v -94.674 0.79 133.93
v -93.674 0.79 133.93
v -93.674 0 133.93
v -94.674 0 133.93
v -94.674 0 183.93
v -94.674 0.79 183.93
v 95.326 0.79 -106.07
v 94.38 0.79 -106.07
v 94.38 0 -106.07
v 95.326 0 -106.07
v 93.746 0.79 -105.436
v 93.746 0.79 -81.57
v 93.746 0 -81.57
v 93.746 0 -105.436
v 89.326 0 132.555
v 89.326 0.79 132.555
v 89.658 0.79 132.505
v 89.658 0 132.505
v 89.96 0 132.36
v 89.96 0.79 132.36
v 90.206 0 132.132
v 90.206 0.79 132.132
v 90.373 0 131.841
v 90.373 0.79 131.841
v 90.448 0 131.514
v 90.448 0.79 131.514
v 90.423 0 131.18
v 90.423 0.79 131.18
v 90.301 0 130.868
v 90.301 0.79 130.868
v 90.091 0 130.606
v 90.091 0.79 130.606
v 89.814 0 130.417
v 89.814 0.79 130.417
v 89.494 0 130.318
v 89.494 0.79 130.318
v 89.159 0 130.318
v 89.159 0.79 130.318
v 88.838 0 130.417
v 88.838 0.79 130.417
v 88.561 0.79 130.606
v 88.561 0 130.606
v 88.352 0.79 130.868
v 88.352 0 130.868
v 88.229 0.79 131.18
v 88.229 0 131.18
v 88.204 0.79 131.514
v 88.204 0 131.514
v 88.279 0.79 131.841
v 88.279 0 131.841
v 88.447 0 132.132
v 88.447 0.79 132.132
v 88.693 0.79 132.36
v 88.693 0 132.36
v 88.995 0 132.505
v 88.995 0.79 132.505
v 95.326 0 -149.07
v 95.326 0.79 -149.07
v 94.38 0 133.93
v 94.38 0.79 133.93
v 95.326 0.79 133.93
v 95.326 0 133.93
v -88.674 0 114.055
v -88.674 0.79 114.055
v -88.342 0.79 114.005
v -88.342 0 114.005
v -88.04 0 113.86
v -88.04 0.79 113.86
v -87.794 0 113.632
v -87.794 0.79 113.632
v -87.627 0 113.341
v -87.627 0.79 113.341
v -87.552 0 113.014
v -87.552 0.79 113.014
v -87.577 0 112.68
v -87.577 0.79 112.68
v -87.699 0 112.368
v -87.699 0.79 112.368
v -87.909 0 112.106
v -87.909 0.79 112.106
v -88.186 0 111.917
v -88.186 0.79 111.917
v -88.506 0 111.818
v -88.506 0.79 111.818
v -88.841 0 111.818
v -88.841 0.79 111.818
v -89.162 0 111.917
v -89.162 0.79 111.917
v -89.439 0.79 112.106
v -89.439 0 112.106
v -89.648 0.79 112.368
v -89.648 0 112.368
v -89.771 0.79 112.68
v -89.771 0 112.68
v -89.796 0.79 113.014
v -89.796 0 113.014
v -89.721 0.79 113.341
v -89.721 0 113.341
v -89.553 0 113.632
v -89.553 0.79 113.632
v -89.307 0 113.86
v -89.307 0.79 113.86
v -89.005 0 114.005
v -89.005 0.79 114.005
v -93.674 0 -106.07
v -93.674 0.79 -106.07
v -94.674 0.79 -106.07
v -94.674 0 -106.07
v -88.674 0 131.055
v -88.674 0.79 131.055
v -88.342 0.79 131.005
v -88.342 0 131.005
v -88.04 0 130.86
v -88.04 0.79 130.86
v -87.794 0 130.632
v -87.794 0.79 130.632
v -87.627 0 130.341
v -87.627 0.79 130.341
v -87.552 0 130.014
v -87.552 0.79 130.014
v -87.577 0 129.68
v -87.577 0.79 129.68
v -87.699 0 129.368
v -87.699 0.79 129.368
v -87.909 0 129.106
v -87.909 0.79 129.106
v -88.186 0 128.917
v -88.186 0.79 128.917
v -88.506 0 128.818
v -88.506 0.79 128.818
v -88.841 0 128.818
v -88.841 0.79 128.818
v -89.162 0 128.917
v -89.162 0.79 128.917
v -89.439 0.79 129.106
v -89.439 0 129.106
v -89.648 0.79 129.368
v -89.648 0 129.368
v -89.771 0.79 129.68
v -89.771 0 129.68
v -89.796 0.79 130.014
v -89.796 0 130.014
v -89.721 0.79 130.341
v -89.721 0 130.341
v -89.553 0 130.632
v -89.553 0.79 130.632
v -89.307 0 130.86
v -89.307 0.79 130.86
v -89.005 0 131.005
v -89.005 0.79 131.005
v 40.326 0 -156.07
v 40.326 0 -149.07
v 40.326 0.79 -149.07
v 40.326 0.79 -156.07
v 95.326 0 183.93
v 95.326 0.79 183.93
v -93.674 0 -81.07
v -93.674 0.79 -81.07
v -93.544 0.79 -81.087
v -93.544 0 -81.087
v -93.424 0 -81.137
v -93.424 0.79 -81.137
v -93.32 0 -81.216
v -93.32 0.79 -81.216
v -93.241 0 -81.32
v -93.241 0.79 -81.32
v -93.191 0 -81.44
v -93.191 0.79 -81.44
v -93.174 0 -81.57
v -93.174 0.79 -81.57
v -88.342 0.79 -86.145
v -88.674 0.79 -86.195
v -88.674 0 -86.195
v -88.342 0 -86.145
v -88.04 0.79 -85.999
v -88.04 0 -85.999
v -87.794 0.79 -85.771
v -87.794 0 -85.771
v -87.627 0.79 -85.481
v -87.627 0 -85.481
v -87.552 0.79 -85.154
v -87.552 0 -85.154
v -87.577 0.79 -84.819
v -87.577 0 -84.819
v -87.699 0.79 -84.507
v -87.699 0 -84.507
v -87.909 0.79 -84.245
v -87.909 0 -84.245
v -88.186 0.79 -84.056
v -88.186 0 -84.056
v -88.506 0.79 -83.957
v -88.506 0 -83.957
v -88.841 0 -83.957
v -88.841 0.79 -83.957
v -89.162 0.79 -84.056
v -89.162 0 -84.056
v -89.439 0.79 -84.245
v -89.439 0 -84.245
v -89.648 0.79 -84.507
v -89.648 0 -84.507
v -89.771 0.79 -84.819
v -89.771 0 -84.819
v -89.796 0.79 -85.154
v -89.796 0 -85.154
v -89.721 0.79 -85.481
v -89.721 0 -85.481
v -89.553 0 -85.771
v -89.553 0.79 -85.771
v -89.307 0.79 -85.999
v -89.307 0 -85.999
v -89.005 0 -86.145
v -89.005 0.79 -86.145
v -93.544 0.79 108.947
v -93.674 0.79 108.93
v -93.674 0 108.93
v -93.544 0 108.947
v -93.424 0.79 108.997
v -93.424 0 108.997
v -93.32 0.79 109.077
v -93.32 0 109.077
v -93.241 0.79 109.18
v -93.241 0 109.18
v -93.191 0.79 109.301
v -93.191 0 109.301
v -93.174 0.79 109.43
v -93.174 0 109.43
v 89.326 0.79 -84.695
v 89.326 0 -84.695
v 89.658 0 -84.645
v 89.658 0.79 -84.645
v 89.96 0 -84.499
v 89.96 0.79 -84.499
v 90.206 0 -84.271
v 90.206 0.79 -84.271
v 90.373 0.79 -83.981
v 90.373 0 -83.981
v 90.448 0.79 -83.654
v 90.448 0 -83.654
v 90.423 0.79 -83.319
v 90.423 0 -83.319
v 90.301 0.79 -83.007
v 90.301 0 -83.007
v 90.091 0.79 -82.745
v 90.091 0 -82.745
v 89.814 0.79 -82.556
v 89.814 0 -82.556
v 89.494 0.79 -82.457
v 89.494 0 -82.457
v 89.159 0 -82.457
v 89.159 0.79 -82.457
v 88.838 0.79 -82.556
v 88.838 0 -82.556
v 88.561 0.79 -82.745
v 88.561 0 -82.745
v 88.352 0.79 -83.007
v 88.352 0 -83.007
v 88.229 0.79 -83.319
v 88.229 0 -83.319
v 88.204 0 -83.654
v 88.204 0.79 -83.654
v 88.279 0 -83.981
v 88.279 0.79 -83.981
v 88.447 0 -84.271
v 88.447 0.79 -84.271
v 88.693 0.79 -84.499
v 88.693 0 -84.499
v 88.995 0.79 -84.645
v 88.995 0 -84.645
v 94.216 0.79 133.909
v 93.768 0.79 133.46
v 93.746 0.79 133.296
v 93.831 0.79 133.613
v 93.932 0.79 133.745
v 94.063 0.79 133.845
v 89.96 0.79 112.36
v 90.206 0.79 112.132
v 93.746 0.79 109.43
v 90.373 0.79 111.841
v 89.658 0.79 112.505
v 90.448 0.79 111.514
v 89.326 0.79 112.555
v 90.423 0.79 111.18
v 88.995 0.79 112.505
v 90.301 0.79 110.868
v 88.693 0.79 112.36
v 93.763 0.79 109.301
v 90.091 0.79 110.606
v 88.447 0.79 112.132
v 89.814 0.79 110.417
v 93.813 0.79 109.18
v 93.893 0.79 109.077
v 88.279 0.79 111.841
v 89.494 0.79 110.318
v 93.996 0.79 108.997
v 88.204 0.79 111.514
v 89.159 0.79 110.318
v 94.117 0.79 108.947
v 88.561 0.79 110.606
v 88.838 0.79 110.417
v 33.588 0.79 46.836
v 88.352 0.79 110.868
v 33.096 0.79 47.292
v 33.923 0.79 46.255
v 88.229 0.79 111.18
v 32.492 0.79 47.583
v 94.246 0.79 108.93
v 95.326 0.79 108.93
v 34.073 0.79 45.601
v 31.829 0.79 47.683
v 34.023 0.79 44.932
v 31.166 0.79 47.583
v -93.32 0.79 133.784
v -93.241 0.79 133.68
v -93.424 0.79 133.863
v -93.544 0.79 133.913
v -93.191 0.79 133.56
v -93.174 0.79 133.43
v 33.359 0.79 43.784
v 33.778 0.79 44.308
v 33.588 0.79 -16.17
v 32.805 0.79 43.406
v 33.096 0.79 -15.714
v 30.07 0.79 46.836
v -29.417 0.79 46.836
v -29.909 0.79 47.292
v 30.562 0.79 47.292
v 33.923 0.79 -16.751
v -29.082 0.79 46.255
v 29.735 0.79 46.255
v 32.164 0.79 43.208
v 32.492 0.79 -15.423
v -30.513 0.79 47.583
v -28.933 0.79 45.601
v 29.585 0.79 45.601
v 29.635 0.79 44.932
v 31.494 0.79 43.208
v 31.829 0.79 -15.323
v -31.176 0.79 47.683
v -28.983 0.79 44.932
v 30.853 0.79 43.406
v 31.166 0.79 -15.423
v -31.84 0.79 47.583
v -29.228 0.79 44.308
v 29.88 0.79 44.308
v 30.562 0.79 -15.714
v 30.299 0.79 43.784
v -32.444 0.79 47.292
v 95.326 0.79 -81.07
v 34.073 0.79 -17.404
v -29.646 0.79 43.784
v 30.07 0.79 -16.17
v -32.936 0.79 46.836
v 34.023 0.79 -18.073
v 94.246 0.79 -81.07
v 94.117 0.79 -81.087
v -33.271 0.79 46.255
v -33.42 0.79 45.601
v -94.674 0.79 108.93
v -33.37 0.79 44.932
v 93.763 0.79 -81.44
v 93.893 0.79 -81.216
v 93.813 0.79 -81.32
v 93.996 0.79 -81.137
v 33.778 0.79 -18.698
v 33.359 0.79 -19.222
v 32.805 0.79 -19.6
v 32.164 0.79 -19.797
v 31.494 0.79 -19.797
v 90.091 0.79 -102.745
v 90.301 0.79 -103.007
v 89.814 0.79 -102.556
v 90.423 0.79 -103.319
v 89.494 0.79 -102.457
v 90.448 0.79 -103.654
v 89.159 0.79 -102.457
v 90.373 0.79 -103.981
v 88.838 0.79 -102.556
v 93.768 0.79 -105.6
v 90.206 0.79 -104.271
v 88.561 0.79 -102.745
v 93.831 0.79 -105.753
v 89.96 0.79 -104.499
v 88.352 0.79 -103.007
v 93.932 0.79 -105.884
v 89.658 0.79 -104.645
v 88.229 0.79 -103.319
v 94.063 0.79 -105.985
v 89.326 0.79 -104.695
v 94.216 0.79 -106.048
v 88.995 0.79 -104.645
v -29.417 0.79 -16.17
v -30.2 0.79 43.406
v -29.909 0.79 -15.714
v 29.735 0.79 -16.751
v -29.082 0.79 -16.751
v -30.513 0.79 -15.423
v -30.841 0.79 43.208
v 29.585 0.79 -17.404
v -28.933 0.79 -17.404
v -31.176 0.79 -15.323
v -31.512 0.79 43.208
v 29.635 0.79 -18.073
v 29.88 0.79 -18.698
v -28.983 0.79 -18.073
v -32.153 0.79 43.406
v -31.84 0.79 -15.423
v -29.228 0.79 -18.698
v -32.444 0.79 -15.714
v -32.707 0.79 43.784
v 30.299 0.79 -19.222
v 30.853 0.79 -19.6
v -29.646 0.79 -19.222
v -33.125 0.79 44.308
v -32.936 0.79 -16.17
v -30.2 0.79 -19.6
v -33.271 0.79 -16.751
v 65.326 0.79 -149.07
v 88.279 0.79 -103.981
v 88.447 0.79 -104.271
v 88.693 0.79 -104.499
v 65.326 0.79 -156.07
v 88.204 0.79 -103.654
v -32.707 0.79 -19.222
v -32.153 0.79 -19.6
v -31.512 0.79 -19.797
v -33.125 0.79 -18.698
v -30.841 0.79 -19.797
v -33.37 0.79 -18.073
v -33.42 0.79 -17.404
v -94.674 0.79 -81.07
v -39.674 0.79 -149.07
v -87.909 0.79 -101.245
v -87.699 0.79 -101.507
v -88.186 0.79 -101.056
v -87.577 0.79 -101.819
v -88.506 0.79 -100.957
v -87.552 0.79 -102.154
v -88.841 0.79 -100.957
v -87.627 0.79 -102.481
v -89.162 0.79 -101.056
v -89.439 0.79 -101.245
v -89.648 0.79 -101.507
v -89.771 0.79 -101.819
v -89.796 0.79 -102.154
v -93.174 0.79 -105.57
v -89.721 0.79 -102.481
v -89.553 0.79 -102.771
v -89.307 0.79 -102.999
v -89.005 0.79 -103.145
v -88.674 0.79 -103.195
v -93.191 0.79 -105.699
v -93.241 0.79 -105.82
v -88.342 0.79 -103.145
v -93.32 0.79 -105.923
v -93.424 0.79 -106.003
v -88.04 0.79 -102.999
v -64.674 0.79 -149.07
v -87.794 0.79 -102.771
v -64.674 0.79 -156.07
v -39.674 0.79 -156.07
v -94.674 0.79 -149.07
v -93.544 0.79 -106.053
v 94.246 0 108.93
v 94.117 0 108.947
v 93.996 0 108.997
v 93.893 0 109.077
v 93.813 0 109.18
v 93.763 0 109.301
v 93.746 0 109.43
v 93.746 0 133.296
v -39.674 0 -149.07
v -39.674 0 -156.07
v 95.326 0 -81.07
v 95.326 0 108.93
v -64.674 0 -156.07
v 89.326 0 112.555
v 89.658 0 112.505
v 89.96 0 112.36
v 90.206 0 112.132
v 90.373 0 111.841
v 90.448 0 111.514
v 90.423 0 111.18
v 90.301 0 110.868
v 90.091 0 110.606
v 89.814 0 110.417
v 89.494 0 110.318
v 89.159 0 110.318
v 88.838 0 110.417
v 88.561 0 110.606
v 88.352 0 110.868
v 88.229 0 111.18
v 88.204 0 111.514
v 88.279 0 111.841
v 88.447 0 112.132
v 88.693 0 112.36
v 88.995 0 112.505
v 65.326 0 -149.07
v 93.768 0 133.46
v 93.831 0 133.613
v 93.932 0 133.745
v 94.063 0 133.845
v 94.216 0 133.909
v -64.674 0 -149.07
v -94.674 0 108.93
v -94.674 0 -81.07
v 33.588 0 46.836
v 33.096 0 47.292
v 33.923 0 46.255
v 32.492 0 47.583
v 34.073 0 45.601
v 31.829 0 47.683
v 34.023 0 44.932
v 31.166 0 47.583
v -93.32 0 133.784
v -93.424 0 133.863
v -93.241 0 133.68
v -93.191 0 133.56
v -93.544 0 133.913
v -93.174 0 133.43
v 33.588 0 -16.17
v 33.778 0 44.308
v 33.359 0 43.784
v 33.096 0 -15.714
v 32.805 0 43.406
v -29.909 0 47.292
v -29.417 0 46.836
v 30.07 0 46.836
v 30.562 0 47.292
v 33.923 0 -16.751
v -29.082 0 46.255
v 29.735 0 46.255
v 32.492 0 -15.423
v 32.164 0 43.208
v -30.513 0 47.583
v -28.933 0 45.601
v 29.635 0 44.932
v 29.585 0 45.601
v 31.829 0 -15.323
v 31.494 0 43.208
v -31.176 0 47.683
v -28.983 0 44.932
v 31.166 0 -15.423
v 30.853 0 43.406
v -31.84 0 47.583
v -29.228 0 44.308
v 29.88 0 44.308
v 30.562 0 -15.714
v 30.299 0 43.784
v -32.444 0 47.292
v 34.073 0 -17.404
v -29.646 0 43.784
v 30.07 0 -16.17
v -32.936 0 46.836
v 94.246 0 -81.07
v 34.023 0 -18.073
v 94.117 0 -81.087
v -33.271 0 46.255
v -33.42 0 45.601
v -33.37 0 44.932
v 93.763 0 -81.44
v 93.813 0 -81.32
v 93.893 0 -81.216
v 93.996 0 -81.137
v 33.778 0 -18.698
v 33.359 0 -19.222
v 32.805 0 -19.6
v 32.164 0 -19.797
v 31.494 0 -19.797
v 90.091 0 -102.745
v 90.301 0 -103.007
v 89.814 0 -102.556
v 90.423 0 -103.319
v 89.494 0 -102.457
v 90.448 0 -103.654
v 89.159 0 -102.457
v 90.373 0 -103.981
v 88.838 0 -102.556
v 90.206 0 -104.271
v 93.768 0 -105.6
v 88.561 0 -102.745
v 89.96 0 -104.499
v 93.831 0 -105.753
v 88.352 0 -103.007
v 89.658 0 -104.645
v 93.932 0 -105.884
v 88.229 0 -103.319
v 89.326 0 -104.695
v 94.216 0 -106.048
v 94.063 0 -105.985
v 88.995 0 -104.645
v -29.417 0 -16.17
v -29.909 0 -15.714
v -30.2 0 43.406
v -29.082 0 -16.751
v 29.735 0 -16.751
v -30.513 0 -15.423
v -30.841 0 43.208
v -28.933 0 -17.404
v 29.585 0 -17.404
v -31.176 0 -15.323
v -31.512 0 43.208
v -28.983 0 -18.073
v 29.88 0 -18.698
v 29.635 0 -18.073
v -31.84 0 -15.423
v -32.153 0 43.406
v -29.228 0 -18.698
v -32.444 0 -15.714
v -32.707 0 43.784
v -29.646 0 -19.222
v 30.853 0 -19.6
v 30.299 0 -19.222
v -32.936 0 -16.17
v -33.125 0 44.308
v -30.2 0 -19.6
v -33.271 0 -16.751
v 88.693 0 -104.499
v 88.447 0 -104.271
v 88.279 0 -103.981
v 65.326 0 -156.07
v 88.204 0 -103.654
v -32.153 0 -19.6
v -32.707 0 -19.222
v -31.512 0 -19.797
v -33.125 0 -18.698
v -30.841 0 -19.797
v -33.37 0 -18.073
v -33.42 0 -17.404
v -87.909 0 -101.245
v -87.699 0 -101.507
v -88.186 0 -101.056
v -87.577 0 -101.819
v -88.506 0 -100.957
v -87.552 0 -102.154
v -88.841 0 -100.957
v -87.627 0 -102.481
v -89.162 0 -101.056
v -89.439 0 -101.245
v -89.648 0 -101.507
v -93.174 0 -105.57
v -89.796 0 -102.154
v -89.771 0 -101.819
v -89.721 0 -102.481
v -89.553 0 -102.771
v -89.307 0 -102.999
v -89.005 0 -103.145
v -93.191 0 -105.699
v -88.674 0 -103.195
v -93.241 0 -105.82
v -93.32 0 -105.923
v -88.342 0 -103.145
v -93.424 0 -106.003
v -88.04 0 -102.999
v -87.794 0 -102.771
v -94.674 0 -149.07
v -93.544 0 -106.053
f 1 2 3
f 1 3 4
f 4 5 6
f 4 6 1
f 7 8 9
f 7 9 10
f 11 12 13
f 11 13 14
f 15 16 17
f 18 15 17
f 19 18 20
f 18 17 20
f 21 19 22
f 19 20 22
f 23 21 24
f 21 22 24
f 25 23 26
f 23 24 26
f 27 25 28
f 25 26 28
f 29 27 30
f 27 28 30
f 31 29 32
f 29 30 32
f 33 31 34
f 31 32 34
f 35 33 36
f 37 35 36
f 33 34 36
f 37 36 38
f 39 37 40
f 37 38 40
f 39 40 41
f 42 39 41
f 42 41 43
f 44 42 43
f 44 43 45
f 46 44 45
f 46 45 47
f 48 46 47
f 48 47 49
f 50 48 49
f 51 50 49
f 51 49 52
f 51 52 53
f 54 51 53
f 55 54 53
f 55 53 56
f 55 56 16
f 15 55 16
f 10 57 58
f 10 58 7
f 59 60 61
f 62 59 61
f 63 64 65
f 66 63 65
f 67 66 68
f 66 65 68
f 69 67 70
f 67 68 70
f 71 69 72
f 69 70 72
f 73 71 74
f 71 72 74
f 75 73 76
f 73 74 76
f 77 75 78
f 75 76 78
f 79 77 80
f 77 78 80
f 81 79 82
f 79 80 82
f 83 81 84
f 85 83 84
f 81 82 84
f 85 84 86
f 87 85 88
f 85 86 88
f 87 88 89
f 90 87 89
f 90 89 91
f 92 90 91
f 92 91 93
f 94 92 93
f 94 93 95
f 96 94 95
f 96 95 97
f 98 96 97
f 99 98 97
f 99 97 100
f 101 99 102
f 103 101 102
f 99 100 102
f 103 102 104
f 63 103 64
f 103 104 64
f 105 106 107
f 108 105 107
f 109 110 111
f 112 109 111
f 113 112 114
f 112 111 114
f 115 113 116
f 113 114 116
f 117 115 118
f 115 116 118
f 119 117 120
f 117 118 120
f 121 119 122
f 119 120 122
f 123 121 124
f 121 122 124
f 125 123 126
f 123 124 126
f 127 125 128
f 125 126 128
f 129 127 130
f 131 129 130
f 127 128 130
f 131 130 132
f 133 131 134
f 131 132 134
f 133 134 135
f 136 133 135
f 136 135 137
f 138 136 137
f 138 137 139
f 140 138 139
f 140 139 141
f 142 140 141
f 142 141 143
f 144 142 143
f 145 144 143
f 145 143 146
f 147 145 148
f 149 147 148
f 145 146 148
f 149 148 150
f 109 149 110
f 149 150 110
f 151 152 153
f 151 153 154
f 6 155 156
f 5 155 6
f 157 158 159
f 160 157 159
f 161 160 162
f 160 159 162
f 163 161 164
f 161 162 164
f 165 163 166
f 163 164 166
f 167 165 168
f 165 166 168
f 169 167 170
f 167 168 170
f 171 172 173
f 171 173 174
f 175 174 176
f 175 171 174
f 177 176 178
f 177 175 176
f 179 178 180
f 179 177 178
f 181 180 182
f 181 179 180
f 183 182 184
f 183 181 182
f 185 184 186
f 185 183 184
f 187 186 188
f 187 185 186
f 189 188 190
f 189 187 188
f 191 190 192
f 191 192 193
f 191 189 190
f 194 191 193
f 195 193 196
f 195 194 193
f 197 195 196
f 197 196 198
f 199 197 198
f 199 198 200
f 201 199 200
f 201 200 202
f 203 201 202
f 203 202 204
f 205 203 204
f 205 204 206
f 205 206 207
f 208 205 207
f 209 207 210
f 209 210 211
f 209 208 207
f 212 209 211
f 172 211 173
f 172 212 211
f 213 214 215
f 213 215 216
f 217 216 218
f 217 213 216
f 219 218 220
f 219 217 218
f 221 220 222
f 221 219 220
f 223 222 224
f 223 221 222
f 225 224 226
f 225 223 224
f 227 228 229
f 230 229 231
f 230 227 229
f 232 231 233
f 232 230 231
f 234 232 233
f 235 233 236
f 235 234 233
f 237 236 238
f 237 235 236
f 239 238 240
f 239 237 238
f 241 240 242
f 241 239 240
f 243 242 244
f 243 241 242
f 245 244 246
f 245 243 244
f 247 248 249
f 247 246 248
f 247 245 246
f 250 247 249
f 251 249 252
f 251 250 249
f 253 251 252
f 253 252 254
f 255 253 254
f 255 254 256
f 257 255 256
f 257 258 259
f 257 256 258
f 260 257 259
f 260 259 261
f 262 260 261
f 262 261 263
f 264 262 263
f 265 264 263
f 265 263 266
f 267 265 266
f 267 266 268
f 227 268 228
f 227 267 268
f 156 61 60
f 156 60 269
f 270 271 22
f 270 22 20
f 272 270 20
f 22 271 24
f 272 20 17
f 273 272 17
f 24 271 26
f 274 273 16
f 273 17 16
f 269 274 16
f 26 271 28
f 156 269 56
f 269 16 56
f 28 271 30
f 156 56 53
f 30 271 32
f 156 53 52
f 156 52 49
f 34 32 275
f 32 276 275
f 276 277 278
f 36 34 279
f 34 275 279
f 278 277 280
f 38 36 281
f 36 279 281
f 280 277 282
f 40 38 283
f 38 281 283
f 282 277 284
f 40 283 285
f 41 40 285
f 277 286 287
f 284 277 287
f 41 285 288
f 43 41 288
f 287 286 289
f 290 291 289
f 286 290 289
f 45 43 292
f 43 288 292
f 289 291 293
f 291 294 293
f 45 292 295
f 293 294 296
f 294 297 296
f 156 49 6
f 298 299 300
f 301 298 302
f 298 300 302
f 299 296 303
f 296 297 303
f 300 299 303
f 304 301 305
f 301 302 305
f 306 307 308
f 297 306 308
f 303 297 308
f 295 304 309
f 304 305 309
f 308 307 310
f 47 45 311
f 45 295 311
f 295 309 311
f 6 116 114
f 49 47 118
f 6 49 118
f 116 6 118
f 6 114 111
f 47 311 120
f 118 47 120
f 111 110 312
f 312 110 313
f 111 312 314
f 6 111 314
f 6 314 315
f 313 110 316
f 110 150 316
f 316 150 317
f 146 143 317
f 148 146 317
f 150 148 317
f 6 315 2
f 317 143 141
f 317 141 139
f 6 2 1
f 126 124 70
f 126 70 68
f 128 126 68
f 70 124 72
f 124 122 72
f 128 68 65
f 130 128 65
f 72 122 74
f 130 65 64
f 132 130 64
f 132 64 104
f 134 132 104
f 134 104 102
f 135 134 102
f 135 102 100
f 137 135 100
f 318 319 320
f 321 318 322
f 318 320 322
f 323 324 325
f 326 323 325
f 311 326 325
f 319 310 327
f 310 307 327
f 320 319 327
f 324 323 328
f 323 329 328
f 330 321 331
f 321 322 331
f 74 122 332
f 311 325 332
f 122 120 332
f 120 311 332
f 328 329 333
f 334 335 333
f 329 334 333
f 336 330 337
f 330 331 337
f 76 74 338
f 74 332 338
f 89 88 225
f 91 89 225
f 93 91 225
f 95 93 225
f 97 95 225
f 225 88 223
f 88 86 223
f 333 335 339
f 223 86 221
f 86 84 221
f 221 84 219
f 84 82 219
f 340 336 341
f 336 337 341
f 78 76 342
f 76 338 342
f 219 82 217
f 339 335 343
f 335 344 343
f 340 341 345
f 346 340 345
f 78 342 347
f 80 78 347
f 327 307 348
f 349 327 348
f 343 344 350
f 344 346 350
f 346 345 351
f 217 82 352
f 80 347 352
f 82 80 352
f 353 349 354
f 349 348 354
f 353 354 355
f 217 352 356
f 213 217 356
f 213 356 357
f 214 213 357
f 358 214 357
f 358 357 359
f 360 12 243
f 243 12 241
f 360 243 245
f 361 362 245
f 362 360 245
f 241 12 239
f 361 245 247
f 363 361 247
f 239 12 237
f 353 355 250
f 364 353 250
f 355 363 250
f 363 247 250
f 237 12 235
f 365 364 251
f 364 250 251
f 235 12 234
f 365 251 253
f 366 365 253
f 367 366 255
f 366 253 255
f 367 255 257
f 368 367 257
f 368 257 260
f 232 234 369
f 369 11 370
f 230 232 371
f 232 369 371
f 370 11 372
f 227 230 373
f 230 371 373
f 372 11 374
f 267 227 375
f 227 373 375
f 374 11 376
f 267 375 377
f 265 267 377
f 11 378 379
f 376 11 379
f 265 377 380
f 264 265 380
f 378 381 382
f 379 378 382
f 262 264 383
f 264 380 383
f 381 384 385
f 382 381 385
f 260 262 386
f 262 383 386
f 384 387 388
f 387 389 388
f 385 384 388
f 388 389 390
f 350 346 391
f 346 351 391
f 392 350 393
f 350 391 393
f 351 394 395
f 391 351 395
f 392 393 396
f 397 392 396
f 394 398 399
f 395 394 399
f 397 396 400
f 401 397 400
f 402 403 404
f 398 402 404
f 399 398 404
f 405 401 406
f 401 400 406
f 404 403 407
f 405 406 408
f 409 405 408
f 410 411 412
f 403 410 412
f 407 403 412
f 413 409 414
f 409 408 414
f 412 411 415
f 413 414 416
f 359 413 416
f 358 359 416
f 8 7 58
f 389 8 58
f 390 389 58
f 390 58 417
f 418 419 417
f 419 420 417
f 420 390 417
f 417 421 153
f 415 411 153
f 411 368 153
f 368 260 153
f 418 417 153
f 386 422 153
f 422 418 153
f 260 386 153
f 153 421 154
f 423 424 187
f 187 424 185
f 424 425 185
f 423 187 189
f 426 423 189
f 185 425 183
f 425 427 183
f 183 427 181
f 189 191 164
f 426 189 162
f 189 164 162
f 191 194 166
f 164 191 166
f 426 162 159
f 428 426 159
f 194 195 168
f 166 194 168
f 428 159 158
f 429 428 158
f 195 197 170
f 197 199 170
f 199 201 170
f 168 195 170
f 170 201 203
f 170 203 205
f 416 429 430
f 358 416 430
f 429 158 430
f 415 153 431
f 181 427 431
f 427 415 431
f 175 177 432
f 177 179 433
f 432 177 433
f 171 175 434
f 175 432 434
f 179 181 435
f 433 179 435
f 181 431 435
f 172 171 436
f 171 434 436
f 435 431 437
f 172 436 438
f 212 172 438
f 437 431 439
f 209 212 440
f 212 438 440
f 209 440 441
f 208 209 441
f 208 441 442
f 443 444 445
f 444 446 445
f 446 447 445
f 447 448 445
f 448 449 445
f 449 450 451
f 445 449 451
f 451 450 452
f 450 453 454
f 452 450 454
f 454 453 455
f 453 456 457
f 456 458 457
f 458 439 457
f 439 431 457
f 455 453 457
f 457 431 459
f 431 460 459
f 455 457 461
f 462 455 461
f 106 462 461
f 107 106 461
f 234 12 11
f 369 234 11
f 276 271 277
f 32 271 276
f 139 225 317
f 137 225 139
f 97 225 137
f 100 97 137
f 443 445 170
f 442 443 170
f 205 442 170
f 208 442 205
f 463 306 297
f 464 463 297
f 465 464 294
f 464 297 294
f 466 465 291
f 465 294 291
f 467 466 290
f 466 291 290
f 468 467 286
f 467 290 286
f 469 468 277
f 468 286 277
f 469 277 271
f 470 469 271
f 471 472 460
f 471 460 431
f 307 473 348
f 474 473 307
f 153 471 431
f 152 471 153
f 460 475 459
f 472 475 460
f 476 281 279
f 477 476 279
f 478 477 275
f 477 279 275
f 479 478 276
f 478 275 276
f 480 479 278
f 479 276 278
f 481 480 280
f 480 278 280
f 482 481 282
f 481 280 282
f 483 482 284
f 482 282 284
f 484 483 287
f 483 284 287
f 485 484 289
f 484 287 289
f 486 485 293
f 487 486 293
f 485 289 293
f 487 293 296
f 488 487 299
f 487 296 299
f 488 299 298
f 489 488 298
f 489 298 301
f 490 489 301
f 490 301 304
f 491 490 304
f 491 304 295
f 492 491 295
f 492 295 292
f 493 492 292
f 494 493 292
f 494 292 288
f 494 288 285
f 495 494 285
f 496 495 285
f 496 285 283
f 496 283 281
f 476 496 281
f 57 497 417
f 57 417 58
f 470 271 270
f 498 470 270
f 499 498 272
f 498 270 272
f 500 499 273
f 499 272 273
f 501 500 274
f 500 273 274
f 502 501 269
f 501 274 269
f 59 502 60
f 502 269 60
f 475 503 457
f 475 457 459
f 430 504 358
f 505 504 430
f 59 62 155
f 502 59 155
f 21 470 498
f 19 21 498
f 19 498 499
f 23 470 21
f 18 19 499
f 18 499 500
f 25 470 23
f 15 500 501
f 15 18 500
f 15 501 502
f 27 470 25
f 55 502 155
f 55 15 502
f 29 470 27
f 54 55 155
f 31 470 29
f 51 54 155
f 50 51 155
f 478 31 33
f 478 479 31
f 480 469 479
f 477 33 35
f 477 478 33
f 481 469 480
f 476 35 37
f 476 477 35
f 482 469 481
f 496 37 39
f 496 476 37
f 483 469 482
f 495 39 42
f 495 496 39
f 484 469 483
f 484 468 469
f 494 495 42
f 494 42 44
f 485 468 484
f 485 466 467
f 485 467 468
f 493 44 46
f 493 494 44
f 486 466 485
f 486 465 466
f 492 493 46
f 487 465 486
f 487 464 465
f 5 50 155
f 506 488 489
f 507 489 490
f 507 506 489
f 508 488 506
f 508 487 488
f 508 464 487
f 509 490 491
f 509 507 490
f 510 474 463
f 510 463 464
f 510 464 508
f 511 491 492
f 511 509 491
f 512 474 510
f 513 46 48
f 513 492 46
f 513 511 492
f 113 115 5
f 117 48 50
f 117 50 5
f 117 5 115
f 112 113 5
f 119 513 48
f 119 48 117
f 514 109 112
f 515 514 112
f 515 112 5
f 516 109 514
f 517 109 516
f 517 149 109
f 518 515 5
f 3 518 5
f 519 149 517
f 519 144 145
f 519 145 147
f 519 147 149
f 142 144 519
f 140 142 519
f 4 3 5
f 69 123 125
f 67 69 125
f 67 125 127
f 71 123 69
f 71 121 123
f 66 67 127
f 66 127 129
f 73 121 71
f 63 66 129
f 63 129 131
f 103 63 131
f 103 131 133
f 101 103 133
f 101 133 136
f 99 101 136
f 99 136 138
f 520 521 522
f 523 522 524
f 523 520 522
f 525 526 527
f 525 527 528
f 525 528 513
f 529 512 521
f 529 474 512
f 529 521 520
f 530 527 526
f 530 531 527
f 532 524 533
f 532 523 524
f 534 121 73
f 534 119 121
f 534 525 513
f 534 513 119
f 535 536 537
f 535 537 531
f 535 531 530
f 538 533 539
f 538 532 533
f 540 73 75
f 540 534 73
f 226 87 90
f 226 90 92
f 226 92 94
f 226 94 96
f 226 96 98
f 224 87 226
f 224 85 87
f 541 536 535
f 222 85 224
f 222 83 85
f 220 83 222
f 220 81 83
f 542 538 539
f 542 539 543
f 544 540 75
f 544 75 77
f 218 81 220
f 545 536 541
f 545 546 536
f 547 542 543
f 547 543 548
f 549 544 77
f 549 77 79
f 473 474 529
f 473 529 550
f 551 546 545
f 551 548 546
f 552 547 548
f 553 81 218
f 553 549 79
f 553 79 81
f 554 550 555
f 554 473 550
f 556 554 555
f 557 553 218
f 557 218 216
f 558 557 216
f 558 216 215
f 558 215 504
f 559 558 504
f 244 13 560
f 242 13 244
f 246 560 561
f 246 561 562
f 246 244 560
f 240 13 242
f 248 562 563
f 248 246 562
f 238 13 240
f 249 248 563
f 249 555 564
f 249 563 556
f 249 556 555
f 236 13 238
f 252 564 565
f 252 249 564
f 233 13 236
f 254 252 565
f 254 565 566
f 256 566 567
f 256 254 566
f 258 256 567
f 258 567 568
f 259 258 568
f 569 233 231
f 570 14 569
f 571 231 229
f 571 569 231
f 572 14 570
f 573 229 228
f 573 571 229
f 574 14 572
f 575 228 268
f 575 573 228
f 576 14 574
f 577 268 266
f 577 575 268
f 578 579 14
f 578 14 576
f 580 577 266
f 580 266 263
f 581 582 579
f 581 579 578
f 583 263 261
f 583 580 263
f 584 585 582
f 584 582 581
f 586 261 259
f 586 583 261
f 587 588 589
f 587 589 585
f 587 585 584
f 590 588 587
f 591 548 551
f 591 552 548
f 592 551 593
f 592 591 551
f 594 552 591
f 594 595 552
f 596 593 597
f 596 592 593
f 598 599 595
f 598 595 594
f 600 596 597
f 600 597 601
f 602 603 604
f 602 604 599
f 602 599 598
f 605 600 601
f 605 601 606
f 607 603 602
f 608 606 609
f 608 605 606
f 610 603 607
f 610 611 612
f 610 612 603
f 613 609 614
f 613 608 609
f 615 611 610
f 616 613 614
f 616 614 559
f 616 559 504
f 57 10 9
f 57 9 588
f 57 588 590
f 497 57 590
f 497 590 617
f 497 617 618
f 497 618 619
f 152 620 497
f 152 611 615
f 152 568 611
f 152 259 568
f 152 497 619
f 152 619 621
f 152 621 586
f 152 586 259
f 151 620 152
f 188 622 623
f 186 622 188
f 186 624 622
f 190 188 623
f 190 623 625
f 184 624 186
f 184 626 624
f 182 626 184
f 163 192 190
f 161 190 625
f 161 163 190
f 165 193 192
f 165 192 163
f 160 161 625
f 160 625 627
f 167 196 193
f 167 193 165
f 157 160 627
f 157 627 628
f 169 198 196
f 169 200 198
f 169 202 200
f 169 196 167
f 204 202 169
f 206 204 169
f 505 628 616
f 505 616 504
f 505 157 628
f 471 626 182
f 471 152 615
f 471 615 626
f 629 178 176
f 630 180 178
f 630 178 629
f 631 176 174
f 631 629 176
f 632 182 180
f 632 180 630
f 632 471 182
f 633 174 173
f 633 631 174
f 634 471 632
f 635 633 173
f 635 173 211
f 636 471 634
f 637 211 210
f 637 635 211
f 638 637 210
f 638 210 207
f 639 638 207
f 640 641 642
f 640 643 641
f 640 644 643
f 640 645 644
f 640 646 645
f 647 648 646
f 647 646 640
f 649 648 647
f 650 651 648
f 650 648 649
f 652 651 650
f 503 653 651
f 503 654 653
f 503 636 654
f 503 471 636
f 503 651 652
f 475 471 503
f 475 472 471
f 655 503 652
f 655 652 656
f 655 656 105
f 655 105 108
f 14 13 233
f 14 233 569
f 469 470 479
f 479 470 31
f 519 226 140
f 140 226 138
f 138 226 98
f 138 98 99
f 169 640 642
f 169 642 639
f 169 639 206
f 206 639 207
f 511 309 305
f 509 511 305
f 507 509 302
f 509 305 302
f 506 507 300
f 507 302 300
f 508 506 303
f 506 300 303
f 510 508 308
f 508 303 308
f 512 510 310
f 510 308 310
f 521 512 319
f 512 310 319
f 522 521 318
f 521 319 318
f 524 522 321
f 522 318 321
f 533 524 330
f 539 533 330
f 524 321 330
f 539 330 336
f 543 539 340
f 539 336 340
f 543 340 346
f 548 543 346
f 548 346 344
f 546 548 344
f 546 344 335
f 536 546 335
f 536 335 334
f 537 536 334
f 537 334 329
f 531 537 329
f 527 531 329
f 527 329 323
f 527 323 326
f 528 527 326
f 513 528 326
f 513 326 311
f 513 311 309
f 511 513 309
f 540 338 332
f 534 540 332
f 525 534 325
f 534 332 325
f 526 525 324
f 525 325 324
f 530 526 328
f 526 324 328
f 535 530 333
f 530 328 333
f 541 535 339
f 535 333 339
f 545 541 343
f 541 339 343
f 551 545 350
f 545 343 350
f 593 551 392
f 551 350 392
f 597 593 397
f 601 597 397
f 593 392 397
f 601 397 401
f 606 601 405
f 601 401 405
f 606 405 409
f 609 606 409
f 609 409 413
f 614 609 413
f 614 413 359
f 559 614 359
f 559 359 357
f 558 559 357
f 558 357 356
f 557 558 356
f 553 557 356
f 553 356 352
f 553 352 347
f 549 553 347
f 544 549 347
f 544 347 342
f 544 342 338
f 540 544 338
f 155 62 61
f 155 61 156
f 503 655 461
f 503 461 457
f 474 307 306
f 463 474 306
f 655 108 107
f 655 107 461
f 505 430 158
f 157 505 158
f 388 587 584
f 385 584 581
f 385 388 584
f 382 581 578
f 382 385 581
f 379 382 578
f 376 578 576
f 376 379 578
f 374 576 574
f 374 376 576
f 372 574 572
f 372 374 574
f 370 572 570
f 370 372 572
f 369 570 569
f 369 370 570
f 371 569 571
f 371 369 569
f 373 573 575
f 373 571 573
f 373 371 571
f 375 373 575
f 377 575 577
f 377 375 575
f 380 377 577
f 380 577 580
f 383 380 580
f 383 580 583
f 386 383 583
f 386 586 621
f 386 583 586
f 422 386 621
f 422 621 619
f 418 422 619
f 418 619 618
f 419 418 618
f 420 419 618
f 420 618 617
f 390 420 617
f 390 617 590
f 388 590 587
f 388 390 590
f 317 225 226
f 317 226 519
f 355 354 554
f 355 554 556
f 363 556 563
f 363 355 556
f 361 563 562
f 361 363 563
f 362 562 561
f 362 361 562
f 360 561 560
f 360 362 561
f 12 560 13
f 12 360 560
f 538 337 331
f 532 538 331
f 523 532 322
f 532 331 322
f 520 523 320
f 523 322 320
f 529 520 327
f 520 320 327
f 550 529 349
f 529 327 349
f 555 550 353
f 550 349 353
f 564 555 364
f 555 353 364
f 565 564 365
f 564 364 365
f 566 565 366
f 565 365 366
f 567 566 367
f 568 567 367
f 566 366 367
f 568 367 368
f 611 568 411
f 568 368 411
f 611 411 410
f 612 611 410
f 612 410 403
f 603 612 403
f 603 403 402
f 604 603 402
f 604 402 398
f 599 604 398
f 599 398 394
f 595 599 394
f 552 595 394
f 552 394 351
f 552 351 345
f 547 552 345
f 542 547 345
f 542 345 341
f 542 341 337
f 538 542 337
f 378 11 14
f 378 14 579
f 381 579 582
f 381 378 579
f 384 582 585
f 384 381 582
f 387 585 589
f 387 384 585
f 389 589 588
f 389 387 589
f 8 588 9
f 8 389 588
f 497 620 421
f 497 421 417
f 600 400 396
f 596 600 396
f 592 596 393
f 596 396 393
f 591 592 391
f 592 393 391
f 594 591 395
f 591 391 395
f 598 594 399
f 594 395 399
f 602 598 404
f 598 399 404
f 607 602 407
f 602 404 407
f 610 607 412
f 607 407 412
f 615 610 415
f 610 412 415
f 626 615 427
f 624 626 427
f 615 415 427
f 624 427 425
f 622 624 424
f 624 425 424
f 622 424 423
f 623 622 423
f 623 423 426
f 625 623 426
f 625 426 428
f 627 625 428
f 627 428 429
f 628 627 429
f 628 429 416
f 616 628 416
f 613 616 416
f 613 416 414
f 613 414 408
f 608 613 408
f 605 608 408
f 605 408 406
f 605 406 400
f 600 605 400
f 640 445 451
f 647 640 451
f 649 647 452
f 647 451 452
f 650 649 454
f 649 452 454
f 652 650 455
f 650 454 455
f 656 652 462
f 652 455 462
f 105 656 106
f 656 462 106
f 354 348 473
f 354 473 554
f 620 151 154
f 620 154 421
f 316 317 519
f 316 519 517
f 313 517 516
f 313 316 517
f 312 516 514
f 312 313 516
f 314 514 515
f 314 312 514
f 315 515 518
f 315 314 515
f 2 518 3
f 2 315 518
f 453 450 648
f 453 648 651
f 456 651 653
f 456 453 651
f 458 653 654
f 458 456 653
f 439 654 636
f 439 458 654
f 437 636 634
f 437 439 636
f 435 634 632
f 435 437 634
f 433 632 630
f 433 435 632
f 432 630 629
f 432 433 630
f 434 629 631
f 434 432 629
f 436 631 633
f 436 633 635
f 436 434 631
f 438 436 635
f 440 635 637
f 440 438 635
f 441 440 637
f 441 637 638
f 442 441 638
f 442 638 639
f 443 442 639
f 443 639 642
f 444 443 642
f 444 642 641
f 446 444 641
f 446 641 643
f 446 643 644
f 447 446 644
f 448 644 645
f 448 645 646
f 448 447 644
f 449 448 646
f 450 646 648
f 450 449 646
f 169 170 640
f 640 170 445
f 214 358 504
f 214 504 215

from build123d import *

# Parameters (mm, degrees)
PANEL_DEPTH                 = 0.79
SKETCH3_R                   = 1.125
OUTER_HINGE_MOUNT_DEPTH     = 0.79
SKETCH4_R                   = 2.25
MOUNTING_PLATE_HOLES_DEPTH  = 10
SKETCH7_R                   = 1.125
NEW_INNER_HINGE_MOUNT_DEPTH = 10


with BuildPart() as part:
    # Sketch1 → Panel (new body)
    with BuildSketch(Plane(origin=(0, 0, 0), x_dir=(1, 0, 0), z_dir=(0, 1, 0))):
        Polygon((65.326251897, 149.069802731), (95.326251897, 149.069802731), (95.326251897, -183.930197269), (-94.673748103, -183.930197269), (-94.673748103, 149.069802731), (-64.673748103, 149.069802731), (-64.673748103, 156.069802731), (-39.673748103, 156.069802731), (-39.673748103, 149.069802731), (40.326251897, 149.069802731), (40.326251897, 156.069802731), (65.326251897, 156.069802731), align=None)
    extrude(amount=PANEL_DEPTH)

    # Sketch3 → Outer Hinge Mount (cut)
    with BuildSketch(Plane(origin=(0, 0.79, 0), x_dir=(1, 0, 0), z_dir=(0, 1, 0))):
        with Locations(Location((-88.673748103, -112.930197269, 0), (0, 0, 270))):
            Circle(SKETCH3_R)
        with Locations(Location((-88.673748103, -129.930197269, 0), (0, 0, 270))):
            Circle(SKETCH3_R)
        with BuildLine():
            Line((-94.673748103, -108.930197269), (-93.673748103, -108.930197269))
            ThreePointArc((-93.673748103, -108.930197269), (-93.320194713, -109.076643878), (-93.173748103, -109.430197269))
            Line((-93.173748103, -109.430197269), (-93.173748103, -133.430197269))
            ThreePointArc((-93.173748103, -133.430197269), (-93.320194713, -133.783750659), (-93.673748103, -133.930197269))
            Line((-93.673748103, -133.930197269), (-94.673748103, -133.930197269))
            Line((-94.673748103, -133.930197269), (-94.673748103, -108.930197269))
        make_face()
    outer_hinge_mount = extrude(amount=-OUTER_HINGE_MOUNT_DEPTH, mode=Mode.SUBTRACT)

    # Mirror1: Outer Hinge Mount across plane
    add(outer_hinge_mount.mirror(Plane.XY.offset(13.930197269)), mode=Mode.SUBTRACT)

    # Sketch4 → Mounting Plate Holes (cut)
    with BuildSketch(Plane(origin=(0, 0.79, 0), x_dir=(1, 0, 0), z_dir=(0, 1, 0))):
        with Locations(Location((-31.176486576, 17.572541204, 0), (0, 0, 270))):
            Circle(SKETCH4_R)
        with Locations(Location((31.82899037, 17.572541204, 0), (0, 0, 270))):
            Circle(SKETCH4_R)
        with Locations(Location((31.82899037, -45.432935741, 0), (0, 0, 270))):
            Circle(SKETCH4_R)
        with Locations(Location((-31.176486576, -45.432935741, 0), (0, 0, 270))):
            Circle(SKETCH4_R)
    extrude(amount=-MOUNTING_PLATE_HOLES_DEPTH, mode=Mode.SUBTRACT)

    # Sketch7 → New Inner Hinge Mount (cut)
    with BuildSketch(Plane(origin=(0, 0.79, 0), x_dir=(1, 0, 0), z_dir=(0, 1, 0))):
        with Locations(Location((89.326251897, -111.430197269, 0), (0, 0, 270))):
            Circle(SKETCH7_R)
        with Locations(Location((89.326251897, -131.430197269, 0), (0, 0, 270))):
            Circle(SKETCH7_R)
        with BuildLine():
            Line((95.326251897, -108.930197269), (94.246251897, -108.930197269))
            ThreePointArc((94.246251897, -108.930197269), (93.892698506, -109.076643878), (93.746251897, -109.430197269))
            Line((93.746251897, -109.430197269), (93.746251897, -133.296285761))
            ThreePointArc((93.746251897, -133.296285761), (93.931920279, -133.744528887), (94.380163405, -133.930197269))
            Line((94.380163405, -133.930197269), (95.326251897, -133.930197269))
            Line((95.326251897, -133.930197269), (95.326251897, -108.930197269))
        make_face()
    new_inner_hinge_mount = extrude(amount=-NEW_INNER_HINGE_MOUNT_DEPTH, mode=Mode.SUBTRACT)

    # Mirror3: New Inner Hinge Mount across plane
    add(new_inner_hinge_mount.mirror(Plane.XY.offset(13.930197269)), mode=Mode.SUBTRACT)


solid = part.part
